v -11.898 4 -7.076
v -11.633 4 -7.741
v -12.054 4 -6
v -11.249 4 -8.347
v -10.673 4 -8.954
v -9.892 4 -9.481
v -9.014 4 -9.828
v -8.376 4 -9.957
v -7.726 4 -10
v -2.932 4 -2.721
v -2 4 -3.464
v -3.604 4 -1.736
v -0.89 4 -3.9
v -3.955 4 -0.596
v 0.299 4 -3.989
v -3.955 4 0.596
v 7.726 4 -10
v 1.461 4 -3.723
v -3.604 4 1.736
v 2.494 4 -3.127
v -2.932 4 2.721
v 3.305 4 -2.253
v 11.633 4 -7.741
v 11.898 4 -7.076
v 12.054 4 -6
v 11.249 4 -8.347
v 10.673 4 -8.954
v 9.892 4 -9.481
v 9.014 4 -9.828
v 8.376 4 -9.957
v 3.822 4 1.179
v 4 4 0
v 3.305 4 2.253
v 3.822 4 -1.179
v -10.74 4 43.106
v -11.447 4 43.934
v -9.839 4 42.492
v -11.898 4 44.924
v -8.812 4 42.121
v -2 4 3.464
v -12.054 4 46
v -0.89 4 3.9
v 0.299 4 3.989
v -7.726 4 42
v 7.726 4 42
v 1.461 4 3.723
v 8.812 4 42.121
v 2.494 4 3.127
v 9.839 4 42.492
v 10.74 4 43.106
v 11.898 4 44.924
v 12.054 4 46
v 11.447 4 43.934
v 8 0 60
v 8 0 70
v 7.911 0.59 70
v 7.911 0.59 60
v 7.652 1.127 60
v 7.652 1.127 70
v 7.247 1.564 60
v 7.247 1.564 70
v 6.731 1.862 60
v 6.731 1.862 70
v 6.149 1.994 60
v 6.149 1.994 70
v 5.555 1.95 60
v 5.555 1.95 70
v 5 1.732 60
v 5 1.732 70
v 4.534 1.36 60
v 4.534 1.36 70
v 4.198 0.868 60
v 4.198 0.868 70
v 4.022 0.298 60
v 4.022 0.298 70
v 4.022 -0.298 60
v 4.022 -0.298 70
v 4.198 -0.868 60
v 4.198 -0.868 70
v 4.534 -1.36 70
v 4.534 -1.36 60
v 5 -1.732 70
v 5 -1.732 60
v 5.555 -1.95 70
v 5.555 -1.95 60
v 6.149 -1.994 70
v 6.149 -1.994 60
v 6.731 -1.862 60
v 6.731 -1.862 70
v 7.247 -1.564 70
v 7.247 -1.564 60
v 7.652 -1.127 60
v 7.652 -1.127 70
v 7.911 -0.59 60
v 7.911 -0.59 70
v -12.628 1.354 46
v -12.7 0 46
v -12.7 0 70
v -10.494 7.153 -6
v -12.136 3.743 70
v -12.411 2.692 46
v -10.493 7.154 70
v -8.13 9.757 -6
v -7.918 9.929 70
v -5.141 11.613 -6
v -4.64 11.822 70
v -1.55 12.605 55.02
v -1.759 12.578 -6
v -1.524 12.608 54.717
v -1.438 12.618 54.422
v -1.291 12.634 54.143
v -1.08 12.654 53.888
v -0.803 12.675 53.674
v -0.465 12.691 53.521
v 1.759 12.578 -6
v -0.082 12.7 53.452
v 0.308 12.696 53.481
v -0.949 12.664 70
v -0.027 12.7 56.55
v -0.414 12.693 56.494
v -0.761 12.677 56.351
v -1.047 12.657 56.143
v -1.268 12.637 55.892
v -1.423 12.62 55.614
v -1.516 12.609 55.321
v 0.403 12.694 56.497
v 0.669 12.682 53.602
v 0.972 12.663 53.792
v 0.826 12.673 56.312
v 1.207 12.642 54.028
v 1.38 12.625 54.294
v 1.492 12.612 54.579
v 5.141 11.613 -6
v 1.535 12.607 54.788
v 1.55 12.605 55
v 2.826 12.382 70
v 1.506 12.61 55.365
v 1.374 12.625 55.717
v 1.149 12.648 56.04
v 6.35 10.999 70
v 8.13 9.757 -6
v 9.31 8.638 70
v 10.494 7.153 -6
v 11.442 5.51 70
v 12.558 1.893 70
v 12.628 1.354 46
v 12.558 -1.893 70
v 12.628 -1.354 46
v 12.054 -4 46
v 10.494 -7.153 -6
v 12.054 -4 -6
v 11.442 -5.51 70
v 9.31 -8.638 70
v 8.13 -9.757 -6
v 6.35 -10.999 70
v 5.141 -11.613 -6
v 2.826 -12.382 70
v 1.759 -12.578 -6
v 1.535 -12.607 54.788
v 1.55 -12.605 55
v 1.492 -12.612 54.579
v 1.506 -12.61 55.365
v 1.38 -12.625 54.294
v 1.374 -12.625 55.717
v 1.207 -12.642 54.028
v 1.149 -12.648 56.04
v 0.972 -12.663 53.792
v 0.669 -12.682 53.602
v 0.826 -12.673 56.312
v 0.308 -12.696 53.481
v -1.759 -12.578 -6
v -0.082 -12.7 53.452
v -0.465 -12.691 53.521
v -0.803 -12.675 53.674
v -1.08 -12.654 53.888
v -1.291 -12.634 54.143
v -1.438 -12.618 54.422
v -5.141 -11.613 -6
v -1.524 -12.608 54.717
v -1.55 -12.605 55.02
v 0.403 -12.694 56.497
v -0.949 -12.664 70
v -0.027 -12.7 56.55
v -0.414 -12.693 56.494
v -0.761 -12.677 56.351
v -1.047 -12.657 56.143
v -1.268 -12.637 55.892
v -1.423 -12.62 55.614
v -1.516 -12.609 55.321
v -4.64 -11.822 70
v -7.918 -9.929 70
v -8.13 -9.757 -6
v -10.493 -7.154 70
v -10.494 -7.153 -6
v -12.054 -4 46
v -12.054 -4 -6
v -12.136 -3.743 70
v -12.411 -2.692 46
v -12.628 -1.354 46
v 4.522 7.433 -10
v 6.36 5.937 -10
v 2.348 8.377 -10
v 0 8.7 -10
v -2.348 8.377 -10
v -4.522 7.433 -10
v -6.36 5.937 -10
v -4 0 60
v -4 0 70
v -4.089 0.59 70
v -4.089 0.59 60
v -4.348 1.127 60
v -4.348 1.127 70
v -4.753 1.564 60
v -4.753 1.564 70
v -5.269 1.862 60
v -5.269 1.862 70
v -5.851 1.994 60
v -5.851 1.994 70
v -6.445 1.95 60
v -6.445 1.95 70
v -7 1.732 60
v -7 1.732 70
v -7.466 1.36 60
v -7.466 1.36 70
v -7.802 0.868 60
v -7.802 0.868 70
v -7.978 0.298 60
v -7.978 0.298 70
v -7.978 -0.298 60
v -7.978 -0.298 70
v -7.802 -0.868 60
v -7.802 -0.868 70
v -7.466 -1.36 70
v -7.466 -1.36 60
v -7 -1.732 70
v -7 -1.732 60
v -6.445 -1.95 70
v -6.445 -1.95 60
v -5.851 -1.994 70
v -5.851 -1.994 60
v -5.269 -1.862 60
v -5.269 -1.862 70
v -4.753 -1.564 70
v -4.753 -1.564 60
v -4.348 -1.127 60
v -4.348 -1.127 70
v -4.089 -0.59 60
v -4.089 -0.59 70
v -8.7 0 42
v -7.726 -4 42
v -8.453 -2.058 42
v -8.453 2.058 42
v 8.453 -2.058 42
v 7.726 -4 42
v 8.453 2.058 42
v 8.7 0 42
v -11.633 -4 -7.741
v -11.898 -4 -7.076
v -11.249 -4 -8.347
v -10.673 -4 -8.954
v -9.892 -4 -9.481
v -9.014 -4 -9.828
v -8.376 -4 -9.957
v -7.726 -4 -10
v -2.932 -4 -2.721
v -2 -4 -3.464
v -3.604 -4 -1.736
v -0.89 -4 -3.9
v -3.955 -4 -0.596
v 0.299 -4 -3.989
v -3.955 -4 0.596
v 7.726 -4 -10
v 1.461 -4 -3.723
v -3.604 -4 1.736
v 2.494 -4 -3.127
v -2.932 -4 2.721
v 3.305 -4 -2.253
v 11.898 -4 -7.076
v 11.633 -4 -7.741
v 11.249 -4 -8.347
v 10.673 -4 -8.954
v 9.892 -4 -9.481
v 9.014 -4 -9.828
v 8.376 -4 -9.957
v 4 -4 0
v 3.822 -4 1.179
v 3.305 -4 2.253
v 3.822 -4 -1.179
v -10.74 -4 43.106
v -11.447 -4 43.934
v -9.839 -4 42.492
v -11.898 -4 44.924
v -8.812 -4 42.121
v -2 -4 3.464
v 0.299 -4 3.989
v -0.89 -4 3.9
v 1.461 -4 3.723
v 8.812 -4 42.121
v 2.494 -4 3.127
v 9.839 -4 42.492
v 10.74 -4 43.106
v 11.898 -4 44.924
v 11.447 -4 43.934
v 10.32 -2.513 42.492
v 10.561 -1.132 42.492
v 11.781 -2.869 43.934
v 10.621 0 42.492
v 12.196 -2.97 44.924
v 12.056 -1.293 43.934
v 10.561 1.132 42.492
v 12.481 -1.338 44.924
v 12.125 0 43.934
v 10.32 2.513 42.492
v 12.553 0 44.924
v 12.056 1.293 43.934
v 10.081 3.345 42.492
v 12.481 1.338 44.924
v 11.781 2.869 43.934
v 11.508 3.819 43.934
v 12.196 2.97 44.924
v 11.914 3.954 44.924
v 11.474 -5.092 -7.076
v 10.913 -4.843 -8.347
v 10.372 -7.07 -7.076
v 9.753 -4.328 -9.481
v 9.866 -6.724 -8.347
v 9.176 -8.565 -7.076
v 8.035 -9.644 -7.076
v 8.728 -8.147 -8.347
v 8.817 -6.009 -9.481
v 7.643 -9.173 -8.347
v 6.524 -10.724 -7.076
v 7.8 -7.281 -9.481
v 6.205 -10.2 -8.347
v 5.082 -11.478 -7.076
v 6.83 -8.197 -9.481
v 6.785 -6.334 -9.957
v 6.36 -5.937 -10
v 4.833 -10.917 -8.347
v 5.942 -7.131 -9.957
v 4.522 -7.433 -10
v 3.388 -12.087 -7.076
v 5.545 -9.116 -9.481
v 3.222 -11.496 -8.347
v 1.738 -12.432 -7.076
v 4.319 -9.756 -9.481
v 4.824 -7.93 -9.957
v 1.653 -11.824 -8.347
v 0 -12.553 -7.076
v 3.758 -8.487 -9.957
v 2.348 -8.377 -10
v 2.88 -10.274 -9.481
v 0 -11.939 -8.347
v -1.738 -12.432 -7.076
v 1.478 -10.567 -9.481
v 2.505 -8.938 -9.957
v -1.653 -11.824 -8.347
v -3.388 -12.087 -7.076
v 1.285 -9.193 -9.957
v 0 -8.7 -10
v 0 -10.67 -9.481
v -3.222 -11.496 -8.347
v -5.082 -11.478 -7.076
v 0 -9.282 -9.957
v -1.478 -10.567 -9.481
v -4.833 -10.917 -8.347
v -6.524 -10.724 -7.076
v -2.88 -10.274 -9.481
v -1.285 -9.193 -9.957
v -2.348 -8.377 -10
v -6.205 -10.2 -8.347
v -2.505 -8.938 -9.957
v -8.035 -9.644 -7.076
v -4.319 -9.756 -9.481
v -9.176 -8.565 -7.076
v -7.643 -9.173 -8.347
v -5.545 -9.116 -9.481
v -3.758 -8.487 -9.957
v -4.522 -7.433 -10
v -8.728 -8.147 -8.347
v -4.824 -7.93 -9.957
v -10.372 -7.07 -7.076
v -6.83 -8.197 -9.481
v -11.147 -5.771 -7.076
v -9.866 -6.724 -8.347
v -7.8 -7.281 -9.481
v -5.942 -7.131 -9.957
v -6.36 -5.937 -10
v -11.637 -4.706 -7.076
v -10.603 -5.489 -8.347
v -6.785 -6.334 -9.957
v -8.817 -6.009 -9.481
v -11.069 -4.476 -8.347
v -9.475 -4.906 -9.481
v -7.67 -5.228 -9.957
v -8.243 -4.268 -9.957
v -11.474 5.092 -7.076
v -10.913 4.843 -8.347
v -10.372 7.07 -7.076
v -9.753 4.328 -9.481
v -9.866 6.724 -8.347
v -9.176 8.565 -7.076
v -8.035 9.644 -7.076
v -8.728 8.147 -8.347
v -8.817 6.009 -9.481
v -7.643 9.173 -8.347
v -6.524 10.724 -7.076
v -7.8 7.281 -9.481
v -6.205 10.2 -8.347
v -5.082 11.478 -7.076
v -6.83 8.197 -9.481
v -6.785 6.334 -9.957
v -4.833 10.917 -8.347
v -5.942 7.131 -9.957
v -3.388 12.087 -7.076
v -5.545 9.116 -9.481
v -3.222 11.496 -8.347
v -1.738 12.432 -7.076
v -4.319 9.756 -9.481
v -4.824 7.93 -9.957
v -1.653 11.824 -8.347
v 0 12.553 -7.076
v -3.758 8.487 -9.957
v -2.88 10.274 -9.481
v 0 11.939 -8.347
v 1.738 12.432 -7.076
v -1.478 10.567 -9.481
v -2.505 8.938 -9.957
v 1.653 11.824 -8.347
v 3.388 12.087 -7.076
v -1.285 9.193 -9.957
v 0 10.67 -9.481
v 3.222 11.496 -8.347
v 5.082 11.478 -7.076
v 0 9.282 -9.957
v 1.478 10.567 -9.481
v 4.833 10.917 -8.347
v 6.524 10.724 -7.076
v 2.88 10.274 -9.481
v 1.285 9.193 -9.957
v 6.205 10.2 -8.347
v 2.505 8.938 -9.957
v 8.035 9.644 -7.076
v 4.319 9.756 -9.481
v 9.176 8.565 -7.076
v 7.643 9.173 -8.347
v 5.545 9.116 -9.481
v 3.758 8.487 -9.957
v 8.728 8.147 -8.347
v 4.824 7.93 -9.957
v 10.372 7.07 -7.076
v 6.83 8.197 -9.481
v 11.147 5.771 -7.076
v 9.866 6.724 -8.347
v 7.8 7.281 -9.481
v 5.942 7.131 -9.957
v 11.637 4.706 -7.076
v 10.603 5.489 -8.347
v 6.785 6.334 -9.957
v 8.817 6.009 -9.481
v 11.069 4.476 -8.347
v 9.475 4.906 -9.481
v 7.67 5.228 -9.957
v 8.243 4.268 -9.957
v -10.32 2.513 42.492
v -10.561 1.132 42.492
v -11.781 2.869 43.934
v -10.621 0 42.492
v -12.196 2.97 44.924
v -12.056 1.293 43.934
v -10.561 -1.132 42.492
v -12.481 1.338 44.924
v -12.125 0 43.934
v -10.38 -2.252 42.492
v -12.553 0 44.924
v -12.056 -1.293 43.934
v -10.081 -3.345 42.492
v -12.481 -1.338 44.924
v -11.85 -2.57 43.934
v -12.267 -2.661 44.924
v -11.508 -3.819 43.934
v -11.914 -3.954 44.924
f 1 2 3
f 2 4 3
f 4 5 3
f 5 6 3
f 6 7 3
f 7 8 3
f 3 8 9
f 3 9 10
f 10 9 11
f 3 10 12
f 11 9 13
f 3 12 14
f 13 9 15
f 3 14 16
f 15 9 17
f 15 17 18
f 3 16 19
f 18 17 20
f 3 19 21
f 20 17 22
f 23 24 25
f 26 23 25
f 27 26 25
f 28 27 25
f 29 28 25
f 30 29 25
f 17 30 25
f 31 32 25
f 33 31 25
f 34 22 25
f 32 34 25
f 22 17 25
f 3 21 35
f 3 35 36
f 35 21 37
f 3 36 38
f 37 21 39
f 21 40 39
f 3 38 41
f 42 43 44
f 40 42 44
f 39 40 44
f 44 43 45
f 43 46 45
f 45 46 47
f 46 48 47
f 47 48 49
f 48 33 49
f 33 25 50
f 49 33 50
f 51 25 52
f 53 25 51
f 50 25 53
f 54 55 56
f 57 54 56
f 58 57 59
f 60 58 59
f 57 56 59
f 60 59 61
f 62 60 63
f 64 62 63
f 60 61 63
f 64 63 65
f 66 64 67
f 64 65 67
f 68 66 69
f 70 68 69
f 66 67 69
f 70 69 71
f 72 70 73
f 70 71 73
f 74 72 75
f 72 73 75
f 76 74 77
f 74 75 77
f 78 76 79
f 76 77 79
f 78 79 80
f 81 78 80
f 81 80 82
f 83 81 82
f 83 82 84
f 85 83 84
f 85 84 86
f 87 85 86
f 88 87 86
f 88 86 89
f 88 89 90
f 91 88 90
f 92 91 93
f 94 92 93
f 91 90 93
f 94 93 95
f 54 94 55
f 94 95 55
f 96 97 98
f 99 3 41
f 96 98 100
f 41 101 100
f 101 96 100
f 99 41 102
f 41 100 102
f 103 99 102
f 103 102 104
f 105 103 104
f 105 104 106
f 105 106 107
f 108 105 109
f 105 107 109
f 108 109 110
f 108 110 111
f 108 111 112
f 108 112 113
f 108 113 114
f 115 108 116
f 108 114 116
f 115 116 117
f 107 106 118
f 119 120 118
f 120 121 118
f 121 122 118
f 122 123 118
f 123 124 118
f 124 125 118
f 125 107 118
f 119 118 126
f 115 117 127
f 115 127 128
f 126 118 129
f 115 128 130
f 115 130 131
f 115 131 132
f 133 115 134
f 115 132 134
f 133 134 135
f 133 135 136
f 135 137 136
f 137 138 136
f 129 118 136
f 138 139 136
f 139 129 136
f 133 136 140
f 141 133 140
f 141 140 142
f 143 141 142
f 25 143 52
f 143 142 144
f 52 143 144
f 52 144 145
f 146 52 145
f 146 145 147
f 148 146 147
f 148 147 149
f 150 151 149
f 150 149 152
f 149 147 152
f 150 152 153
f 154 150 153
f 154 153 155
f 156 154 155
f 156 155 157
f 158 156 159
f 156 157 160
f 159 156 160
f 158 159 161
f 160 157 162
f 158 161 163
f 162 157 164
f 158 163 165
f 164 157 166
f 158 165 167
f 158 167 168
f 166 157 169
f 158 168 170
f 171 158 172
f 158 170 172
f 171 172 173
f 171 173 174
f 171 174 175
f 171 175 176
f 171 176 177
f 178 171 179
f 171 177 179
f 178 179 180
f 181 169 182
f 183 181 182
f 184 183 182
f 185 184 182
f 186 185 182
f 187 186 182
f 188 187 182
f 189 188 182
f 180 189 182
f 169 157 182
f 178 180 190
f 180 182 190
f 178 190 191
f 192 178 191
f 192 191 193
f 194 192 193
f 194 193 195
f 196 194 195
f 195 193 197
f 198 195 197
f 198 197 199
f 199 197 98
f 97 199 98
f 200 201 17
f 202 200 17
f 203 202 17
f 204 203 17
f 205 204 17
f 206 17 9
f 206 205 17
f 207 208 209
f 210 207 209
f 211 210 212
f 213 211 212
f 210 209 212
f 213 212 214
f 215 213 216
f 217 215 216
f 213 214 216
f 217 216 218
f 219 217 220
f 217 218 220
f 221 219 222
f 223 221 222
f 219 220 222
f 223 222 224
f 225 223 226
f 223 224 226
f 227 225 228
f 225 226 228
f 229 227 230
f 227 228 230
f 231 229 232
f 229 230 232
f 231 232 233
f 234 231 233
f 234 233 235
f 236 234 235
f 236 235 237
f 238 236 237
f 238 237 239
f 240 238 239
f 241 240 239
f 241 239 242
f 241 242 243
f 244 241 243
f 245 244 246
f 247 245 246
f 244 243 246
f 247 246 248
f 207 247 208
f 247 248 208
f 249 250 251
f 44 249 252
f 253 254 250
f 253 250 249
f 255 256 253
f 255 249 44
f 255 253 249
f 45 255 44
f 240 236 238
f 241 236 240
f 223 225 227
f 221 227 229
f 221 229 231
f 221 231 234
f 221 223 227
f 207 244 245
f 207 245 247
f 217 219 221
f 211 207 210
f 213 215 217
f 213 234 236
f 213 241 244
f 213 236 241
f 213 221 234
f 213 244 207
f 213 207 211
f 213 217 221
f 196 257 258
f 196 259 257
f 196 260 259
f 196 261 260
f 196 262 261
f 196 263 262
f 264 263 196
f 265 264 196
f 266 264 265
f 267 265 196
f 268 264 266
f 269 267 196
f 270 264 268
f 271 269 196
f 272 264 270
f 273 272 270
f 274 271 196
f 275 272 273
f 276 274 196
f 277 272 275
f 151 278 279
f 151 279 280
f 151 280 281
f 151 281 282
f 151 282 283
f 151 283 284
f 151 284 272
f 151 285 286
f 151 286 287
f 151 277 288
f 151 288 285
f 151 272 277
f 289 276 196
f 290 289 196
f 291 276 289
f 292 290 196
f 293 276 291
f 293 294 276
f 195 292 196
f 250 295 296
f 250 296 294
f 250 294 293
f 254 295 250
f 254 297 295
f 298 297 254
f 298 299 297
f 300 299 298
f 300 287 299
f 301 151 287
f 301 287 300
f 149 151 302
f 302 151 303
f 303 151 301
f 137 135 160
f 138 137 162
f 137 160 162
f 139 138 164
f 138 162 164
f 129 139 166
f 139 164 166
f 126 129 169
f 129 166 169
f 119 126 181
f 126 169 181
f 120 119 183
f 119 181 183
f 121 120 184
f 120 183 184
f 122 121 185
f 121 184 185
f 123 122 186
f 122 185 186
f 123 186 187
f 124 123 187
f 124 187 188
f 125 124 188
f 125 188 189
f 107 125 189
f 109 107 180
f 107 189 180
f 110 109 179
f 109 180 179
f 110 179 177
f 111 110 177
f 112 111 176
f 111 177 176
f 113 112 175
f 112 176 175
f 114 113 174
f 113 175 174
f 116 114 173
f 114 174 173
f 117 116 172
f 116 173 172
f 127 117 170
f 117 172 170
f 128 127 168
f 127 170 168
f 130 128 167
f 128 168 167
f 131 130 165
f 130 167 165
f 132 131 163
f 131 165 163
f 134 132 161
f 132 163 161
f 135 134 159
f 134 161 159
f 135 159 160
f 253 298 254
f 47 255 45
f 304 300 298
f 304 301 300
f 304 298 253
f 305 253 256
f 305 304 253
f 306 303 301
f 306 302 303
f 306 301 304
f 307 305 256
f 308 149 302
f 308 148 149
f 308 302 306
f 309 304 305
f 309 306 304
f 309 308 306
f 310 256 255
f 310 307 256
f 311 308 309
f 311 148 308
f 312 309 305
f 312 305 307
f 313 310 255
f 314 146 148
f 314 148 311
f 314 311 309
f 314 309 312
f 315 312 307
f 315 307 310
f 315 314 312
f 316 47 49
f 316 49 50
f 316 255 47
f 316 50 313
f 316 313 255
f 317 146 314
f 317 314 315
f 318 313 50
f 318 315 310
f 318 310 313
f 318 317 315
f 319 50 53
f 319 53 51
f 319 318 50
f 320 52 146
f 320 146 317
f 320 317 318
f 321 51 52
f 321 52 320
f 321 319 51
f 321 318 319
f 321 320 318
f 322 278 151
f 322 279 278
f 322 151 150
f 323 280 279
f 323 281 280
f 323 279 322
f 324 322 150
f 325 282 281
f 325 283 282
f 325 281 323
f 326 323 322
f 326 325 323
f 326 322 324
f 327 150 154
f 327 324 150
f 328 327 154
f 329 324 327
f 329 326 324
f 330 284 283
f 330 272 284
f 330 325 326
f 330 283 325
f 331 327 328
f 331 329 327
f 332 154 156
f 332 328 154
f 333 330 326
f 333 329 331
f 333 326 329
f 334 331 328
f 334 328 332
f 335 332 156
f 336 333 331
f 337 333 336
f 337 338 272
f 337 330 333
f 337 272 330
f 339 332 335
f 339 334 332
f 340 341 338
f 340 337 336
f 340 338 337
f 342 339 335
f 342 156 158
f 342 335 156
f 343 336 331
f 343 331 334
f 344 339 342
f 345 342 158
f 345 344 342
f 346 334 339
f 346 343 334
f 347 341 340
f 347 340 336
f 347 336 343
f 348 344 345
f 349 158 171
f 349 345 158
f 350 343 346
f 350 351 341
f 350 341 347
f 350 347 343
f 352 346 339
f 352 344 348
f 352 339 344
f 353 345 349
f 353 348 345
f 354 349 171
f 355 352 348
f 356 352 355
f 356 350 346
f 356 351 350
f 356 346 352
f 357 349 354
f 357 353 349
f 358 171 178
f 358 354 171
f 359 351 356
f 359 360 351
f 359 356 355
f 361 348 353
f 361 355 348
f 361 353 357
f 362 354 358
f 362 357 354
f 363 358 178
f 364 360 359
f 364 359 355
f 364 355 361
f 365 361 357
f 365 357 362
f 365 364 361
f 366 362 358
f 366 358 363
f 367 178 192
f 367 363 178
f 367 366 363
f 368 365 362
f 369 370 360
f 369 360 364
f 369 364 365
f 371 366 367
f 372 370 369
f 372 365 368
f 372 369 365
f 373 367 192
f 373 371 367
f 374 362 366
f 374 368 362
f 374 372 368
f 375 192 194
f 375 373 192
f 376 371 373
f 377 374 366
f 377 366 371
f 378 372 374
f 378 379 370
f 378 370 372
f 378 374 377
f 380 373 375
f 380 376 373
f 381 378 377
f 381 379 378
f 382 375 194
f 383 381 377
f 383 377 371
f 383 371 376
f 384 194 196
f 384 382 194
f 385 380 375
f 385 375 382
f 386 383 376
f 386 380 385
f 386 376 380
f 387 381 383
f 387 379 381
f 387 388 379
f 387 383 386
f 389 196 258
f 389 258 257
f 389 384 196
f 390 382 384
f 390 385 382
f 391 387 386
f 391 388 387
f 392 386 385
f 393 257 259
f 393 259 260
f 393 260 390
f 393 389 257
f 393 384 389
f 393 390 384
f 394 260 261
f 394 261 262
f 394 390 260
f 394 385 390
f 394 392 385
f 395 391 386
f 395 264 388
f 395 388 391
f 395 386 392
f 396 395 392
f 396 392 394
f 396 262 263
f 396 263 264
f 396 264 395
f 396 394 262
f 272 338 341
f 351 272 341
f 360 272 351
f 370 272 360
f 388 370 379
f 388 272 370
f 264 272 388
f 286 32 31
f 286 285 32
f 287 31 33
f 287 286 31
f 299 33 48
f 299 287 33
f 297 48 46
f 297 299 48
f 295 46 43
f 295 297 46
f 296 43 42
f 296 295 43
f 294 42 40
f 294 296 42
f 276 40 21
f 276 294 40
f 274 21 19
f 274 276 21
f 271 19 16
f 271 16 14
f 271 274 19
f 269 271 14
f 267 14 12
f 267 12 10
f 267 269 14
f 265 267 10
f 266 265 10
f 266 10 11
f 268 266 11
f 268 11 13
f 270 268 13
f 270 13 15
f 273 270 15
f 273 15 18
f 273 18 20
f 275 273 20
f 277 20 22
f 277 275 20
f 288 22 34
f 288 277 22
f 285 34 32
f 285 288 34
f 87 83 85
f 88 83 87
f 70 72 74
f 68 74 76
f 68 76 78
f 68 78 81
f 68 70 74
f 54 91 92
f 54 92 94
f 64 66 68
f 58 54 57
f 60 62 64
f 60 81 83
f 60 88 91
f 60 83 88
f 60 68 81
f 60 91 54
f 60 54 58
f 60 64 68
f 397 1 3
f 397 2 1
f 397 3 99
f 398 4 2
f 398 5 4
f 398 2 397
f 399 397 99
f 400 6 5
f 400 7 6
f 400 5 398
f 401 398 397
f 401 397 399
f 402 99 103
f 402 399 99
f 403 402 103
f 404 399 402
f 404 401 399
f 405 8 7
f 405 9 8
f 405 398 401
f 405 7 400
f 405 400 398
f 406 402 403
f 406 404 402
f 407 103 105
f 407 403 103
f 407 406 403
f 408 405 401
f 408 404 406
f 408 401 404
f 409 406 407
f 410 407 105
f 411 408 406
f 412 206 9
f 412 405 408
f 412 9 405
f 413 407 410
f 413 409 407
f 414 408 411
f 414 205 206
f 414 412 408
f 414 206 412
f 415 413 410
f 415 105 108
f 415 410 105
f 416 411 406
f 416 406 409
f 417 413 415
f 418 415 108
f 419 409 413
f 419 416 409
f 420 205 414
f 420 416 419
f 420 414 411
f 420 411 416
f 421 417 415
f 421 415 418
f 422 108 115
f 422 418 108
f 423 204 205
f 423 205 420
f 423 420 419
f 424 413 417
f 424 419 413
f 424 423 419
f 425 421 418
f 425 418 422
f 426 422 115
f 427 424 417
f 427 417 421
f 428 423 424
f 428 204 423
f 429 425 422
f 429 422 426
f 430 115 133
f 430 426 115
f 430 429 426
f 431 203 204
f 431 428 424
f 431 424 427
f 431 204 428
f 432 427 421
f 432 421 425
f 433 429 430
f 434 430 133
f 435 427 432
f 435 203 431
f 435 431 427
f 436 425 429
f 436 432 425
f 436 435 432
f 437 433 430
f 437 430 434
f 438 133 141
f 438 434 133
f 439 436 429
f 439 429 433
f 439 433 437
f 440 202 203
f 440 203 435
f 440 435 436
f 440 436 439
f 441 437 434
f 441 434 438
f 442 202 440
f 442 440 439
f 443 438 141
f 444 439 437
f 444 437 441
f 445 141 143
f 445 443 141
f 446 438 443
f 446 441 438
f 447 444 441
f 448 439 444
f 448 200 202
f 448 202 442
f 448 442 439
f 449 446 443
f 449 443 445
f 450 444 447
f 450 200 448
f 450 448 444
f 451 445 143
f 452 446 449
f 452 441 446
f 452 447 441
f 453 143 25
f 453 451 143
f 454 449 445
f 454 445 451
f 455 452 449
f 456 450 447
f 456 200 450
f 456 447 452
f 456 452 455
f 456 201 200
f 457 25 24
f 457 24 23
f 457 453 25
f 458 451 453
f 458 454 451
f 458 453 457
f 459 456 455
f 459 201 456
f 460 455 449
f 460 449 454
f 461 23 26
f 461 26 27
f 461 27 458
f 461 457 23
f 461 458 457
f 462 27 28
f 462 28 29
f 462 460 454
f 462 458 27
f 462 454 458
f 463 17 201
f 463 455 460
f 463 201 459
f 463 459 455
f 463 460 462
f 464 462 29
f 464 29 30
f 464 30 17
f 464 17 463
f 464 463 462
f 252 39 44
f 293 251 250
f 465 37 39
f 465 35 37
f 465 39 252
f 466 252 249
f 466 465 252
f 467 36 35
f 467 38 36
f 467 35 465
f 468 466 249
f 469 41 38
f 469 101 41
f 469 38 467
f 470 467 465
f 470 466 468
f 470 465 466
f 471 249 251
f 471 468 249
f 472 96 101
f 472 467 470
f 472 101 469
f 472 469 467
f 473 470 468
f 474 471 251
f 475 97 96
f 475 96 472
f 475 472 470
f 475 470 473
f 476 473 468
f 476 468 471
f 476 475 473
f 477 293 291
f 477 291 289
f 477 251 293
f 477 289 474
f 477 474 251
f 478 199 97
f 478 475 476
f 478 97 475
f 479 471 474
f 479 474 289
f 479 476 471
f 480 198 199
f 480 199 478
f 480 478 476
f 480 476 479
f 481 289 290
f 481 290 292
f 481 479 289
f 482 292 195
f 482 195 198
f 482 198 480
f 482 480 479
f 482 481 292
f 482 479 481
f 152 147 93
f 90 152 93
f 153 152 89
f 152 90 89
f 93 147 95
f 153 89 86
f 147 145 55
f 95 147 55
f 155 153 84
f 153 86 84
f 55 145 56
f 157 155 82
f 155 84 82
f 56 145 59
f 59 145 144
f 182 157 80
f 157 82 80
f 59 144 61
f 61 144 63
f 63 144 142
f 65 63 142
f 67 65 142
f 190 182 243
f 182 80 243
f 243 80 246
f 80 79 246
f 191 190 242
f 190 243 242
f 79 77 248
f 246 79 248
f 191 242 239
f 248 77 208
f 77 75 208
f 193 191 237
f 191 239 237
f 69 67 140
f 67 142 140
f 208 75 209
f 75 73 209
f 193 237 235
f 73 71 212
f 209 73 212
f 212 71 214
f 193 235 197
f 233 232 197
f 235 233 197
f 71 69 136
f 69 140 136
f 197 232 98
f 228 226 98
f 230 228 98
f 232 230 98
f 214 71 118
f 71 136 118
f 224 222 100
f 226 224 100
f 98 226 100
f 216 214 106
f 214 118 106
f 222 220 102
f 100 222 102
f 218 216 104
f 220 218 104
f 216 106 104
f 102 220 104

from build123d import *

# Parameters (mm, degrees)
F0_W           = 12.7
F0_H           = 80
F2_W           = 8
F2_H           = 52
F3_DEPTH       = 12.701
F3_DEPTH_BACK  = 12.701
F4_R           = 4
F5_DEPTH       = 5
F6_R           = 2
F7_DEPTH       = 10
F8_R           = 4
F9_R           = 1.55
F10_DEPTH      = 12.7010001
F10_DEPTH_BACK = 12.7010001


with BuildPart() as f1:
    # F0 (on Front) → F1 (revolve)
    with BuildSketch(Plane.XZ):
        with Locations((-6.35, 30)):
            Rectangle(F0_W, F0_H)
    revolve(axis=Axis((0, 0, 30), (0, 0, -1)))

    # F2 (on Right) → F3 (cut, two sides)
    with BuildSketch(Plane.YZ) as f3_sk:
        with Locations((0, 16)):
            Rectangle(F2_W, F2_H)
    extrude(amount=-F3_DEPTH, mode=Mode.SUBTRACT)
    extrude(f3_sk.sketch, amount=F3_DEPTH_BACK, mode=Mode.SUBTRACT)

    # F4 (on Front) → F5 (join, symmetric)
    with BuildSketch(Plane.XZ):
        Circle(F4_R)
    extrude(amount=F5_DEPTH, both=True)

    # F6 (on face) → F7 (cut)
    with BuildSketch(Plane.XY.offset(70)):
        with Locations((-6, 0)):
            Circle(F6_R)
        with Locations((6, 0)):
            Circle(F6_R)
    extrude(amount=-F7_DEPTH, mode=Mode.SUBTRACT)

    # F8
    f8_edges = [f1.edges().sort_by_distance(p)[0] for p in [
        (-12.537366, 2.025944, 42),
        (12.7, 0, 42),
        (-12.537366, -2.025944, 42),
        (0, -12.7, -10),
        (0, 12.7, -10),
    ]]
    fillet(f8_edges, radius=F8_R)

    # F9 (on Front) → F10 (cut, two sides)
    with BuildSketch(Plane.XZ) as f10_sk:
        with Locations((0, 55)):
            Circle(F9_R)
    extrude(amount=F10_DEPTH, mode=Mode.SUBTRACT)
    extrude(f10_sk.sketch, amount=-F10_DEPTH_BACK, mode=Mode.SUBTRACT)


solid = f1.part
